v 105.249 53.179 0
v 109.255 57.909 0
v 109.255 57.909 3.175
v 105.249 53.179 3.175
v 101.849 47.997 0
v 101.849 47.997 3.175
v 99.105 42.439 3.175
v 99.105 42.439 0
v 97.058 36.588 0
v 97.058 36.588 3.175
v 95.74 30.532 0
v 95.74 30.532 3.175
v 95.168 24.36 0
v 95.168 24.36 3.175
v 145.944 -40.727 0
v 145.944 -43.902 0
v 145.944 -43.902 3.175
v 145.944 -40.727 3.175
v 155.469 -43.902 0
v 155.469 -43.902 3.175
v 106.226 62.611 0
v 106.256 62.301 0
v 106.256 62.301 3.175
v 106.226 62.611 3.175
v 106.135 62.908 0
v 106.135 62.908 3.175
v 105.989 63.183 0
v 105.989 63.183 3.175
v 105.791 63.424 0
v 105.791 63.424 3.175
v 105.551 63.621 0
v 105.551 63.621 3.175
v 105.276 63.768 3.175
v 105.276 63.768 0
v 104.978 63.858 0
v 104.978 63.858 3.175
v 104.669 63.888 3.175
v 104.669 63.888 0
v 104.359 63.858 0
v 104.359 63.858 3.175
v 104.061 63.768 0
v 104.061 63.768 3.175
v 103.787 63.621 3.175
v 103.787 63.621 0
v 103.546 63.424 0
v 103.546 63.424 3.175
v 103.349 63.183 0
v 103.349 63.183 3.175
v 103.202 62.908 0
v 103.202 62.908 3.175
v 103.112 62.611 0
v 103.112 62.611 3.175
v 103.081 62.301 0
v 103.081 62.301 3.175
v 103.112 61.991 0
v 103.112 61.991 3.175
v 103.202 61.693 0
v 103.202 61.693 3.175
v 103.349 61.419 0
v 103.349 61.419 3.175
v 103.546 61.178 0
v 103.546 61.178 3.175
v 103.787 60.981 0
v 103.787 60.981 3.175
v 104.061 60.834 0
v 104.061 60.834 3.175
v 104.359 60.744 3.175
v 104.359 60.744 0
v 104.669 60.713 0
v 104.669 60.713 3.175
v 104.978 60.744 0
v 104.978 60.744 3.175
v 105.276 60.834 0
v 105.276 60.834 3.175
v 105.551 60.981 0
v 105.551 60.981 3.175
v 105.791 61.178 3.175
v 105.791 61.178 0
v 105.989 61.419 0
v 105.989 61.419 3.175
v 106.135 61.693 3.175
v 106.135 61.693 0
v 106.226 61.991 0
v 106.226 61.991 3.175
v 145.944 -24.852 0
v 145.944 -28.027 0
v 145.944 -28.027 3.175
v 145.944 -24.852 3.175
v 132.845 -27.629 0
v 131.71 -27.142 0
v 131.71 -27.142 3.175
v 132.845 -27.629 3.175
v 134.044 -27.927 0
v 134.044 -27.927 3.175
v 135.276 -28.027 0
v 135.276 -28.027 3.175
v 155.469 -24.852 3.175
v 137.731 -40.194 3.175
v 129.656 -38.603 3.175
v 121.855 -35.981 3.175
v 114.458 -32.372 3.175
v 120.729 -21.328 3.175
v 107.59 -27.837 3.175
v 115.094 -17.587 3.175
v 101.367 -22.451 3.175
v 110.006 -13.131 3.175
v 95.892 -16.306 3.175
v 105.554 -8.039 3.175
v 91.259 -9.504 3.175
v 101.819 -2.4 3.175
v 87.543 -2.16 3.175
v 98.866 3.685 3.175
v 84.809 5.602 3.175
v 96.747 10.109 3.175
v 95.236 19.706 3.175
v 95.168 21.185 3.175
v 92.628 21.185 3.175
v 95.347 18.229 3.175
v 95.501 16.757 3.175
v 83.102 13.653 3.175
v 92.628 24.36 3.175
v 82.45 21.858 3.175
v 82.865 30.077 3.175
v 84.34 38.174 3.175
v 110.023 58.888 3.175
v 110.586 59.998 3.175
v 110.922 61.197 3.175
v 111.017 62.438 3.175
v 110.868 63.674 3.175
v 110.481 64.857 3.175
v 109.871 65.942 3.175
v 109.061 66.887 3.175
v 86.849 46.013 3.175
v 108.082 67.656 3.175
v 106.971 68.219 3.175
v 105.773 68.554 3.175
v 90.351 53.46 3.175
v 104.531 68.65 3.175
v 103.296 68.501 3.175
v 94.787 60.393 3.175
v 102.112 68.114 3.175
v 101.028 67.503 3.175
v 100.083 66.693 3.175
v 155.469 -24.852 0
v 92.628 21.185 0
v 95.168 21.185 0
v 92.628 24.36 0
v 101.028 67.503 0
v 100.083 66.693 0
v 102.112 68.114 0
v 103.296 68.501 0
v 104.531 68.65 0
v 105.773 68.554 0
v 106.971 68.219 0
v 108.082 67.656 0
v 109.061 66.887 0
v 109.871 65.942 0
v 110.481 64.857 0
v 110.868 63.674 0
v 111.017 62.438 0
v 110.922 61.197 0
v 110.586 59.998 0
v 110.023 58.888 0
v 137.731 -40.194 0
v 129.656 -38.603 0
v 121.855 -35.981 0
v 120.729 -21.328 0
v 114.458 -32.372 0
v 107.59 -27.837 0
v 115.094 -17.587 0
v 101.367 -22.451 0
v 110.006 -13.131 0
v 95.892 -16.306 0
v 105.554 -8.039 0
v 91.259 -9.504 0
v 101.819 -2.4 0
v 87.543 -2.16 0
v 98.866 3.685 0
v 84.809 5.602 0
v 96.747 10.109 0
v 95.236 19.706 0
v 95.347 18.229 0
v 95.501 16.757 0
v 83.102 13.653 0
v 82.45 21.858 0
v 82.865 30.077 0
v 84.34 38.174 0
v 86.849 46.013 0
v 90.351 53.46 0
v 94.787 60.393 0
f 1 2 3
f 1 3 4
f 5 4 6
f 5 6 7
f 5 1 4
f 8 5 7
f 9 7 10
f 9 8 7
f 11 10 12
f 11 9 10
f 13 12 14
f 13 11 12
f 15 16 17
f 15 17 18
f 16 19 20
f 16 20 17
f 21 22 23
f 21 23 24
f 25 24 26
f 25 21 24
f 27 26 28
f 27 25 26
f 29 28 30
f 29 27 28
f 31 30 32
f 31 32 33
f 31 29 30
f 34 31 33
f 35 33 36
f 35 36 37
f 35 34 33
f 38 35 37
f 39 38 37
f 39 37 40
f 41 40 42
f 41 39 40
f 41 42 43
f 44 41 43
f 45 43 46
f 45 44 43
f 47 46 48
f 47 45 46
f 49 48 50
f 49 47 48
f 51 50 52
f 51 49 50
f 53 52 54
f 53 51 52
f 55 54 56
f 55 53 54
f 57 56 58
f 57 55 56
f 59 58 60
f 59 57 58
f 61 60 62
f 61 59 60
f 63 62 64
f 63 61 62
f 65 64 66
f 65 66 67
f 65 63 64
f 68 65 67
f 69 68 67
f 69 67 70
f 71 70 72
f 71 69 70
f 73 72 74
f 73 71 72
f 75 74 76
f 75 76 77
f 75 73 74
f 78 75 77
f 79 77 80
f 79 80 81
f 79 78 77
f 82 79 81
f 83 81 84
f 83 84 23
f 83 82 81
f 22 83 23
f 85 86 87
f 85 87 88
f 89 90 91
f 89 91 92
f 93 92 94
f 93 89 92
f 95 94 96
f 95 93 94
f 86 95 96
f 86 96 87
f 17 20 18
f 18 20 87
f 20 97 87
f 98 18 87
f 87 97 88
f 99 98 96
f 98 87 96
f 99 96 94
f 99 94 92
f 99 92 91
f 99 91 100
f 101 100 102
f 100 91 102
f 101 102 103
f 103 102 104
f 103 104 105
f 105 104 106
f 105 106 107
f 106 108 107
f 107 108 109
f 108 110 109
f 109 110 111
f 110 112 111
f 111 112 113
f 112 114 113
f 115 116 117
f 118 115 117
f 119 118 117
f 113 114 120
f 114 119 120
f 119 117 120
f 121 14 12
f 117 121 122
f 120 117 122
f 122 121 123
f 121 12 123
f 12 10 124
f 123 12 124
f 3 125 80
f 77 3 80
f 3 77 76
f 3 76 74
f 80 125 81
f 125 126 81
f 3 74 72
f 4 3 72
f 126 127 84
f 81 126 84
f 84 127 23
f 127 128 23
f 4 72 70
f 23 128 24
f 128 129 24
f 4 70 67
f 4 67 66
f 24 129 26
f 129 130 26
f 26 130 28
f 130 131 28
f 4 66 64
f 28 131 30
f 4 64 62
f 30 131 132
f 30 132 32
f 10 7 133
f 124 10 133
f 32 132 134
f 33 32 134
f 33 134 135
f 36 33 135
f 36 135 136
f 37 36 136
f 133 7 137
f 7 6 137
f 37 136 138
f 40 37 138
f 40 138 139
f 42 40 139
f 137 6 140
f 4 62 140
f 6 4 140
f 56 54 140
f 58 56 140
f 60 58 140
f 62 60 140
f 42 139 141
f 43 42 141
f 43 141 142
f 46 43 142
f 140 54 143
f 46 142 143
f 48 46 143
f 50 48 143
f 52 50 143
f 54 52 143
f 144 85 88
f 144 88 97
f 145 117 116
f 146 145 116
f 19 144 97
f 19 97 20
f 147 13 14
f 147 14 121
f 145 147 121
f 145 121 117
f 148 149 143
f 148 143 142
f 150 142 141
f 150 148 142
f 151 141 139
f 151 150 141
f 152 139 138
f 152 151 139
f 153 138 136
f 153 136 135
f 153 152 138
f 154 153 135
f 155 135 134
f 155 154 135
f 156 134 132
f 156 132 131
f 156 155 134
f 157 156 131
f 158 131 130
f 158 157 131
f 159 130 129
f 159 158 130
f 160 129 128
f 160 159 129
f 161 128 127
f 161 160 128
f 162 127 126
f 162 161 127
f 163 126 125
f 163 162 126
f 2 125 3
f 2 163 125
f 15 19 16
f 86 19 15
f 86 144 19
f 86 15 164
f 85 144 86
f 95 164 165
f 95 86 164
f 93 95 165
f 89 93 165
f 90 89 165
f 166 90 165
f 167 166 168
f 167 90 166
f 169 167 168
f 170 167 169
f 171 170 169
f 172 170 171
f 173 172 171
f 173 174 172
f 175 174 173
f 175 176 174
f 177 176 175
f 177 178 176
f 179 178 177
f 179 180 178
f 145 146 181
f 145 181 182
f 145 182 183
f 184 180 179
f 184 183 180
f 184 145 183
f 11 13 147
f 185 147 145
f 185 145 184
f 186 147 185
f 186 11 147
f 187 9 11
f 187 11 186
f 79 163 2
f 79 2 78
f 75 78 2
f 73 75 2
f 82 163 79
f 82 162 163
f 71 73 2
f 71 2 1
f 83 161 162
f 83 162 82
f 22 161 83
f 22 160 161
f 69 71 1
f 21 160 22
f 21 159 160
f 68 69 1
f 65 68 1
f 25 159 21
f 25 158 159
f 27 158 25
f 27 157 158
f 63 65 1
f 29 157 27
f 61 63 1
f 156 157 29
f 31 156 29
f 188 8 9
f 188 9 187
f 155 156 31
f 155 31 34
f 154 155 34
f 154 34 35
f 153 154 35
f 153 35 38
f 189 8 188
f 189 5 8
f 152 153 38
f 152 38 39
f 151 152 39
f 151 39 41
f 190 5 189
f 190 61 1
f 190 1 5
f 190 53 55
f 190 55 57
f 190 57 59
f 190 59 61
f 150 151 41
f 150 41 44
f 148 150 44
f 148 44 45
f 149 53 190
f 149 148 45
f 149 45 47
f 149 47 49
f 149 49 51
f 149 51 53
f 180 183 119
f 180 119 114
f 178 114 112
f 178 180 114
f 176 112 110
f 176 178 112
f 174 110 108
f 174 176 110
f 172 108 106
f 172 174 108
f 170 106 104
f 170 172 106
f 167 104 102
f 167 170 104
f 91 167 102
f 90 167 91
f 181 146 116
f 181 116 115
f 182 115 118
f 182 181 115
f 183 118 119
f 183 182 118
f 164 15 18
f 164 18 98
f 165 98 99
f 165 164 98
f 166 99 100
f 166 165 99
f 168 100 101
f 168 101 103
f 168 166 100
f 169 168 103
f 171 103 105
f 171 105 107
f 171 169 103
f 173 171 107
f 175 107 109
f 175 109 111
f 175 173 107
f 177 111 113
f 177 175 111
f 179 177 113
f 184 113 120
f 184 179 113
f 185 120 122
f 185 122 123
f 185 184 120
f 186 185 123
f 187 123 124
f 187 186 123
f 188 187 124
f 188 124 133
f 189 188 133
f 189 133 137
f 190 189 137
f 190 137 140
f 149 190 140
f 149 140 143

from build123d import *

# Parameters (mm, degrees)
SKETCH1_R           = 1.5875
BOSS_EXTRUDE1_DEPTH = 3.175


with BuildPart() as part:
    # Sketch1 → Boss-Extrude1 (new body)
    with BuildSketch(Plane.XY):
        with BuildLine():
            Line((145.943650407, -28.027444193), (145.943650407, -24.852444193))
            Line((145.943650407, -24.852444193), (152.293650407, -24.852444193))
            Line((152.293650407, -24.852444193), (155.468650407, -24.852444193))
            Line((155.468650407, -24.852444193), (155.468650407, -28.027444193))
            Line((155.468650407, -28.027444193), (155.468650407, -40.727444193))
            Line((155.468650407, -40.727444193), (155.468650407, -43.902444193))
            Line((155.468650407, -43.902444193), (145.943650407, -43.902444193))
            Line((145.943650407, -43.902444193), (145.943650407, -40.727444193))
            ThreePointArc((145.943650407, -40.727444193), (87.543306121, -2.160349908), (100.082539295, 66.693034944))
            ThreePointArc((100.082539295, 66.693034944), (109.06069832, 66.887098142), (109.254761518, 57.908939117))
            ThreePointArc((109.254761518, 57.908939117), (99.104850954, 42.438945049), (95.168461153, 24.360055807))
            Line((95.168461153, 24.360055807), (92.628461153, 24.360055807))
            Line((92.628461153, 24.360055807), (92.628461153, 21.185055807))
            Line((92.628461153, 21.185055807), (95.168461153, 21.185055807))
            ThreePointArc((95.168461153, 21.185055807), (95.286372211, 18.967274494), (95.501106091, 16.756766333))
            ThreePointArc((95.501106091, 16.756766333), (103.592613564, -5.281493426), (120.729197754, -21.328140077))
            Line((120.729197754, -21.328140077), (131.710241083, -27.141852582))
            ThreePointArc((131.710241083, -27.141852582), (133.438776966, -27.802732961), (135.275650407, -28.027444193))
            Line((135.275650407, -28.027444193), (145.943650407, -28.027444193))
        make_face()
        with Locations((104.668650407, 62.300987031)):
            Circle(SKETCH1_R, mode=Mode.SUBTRACT)
    extrude(amount=BOSS_EXTRUDE1_DEPTH)


solid = part.part
